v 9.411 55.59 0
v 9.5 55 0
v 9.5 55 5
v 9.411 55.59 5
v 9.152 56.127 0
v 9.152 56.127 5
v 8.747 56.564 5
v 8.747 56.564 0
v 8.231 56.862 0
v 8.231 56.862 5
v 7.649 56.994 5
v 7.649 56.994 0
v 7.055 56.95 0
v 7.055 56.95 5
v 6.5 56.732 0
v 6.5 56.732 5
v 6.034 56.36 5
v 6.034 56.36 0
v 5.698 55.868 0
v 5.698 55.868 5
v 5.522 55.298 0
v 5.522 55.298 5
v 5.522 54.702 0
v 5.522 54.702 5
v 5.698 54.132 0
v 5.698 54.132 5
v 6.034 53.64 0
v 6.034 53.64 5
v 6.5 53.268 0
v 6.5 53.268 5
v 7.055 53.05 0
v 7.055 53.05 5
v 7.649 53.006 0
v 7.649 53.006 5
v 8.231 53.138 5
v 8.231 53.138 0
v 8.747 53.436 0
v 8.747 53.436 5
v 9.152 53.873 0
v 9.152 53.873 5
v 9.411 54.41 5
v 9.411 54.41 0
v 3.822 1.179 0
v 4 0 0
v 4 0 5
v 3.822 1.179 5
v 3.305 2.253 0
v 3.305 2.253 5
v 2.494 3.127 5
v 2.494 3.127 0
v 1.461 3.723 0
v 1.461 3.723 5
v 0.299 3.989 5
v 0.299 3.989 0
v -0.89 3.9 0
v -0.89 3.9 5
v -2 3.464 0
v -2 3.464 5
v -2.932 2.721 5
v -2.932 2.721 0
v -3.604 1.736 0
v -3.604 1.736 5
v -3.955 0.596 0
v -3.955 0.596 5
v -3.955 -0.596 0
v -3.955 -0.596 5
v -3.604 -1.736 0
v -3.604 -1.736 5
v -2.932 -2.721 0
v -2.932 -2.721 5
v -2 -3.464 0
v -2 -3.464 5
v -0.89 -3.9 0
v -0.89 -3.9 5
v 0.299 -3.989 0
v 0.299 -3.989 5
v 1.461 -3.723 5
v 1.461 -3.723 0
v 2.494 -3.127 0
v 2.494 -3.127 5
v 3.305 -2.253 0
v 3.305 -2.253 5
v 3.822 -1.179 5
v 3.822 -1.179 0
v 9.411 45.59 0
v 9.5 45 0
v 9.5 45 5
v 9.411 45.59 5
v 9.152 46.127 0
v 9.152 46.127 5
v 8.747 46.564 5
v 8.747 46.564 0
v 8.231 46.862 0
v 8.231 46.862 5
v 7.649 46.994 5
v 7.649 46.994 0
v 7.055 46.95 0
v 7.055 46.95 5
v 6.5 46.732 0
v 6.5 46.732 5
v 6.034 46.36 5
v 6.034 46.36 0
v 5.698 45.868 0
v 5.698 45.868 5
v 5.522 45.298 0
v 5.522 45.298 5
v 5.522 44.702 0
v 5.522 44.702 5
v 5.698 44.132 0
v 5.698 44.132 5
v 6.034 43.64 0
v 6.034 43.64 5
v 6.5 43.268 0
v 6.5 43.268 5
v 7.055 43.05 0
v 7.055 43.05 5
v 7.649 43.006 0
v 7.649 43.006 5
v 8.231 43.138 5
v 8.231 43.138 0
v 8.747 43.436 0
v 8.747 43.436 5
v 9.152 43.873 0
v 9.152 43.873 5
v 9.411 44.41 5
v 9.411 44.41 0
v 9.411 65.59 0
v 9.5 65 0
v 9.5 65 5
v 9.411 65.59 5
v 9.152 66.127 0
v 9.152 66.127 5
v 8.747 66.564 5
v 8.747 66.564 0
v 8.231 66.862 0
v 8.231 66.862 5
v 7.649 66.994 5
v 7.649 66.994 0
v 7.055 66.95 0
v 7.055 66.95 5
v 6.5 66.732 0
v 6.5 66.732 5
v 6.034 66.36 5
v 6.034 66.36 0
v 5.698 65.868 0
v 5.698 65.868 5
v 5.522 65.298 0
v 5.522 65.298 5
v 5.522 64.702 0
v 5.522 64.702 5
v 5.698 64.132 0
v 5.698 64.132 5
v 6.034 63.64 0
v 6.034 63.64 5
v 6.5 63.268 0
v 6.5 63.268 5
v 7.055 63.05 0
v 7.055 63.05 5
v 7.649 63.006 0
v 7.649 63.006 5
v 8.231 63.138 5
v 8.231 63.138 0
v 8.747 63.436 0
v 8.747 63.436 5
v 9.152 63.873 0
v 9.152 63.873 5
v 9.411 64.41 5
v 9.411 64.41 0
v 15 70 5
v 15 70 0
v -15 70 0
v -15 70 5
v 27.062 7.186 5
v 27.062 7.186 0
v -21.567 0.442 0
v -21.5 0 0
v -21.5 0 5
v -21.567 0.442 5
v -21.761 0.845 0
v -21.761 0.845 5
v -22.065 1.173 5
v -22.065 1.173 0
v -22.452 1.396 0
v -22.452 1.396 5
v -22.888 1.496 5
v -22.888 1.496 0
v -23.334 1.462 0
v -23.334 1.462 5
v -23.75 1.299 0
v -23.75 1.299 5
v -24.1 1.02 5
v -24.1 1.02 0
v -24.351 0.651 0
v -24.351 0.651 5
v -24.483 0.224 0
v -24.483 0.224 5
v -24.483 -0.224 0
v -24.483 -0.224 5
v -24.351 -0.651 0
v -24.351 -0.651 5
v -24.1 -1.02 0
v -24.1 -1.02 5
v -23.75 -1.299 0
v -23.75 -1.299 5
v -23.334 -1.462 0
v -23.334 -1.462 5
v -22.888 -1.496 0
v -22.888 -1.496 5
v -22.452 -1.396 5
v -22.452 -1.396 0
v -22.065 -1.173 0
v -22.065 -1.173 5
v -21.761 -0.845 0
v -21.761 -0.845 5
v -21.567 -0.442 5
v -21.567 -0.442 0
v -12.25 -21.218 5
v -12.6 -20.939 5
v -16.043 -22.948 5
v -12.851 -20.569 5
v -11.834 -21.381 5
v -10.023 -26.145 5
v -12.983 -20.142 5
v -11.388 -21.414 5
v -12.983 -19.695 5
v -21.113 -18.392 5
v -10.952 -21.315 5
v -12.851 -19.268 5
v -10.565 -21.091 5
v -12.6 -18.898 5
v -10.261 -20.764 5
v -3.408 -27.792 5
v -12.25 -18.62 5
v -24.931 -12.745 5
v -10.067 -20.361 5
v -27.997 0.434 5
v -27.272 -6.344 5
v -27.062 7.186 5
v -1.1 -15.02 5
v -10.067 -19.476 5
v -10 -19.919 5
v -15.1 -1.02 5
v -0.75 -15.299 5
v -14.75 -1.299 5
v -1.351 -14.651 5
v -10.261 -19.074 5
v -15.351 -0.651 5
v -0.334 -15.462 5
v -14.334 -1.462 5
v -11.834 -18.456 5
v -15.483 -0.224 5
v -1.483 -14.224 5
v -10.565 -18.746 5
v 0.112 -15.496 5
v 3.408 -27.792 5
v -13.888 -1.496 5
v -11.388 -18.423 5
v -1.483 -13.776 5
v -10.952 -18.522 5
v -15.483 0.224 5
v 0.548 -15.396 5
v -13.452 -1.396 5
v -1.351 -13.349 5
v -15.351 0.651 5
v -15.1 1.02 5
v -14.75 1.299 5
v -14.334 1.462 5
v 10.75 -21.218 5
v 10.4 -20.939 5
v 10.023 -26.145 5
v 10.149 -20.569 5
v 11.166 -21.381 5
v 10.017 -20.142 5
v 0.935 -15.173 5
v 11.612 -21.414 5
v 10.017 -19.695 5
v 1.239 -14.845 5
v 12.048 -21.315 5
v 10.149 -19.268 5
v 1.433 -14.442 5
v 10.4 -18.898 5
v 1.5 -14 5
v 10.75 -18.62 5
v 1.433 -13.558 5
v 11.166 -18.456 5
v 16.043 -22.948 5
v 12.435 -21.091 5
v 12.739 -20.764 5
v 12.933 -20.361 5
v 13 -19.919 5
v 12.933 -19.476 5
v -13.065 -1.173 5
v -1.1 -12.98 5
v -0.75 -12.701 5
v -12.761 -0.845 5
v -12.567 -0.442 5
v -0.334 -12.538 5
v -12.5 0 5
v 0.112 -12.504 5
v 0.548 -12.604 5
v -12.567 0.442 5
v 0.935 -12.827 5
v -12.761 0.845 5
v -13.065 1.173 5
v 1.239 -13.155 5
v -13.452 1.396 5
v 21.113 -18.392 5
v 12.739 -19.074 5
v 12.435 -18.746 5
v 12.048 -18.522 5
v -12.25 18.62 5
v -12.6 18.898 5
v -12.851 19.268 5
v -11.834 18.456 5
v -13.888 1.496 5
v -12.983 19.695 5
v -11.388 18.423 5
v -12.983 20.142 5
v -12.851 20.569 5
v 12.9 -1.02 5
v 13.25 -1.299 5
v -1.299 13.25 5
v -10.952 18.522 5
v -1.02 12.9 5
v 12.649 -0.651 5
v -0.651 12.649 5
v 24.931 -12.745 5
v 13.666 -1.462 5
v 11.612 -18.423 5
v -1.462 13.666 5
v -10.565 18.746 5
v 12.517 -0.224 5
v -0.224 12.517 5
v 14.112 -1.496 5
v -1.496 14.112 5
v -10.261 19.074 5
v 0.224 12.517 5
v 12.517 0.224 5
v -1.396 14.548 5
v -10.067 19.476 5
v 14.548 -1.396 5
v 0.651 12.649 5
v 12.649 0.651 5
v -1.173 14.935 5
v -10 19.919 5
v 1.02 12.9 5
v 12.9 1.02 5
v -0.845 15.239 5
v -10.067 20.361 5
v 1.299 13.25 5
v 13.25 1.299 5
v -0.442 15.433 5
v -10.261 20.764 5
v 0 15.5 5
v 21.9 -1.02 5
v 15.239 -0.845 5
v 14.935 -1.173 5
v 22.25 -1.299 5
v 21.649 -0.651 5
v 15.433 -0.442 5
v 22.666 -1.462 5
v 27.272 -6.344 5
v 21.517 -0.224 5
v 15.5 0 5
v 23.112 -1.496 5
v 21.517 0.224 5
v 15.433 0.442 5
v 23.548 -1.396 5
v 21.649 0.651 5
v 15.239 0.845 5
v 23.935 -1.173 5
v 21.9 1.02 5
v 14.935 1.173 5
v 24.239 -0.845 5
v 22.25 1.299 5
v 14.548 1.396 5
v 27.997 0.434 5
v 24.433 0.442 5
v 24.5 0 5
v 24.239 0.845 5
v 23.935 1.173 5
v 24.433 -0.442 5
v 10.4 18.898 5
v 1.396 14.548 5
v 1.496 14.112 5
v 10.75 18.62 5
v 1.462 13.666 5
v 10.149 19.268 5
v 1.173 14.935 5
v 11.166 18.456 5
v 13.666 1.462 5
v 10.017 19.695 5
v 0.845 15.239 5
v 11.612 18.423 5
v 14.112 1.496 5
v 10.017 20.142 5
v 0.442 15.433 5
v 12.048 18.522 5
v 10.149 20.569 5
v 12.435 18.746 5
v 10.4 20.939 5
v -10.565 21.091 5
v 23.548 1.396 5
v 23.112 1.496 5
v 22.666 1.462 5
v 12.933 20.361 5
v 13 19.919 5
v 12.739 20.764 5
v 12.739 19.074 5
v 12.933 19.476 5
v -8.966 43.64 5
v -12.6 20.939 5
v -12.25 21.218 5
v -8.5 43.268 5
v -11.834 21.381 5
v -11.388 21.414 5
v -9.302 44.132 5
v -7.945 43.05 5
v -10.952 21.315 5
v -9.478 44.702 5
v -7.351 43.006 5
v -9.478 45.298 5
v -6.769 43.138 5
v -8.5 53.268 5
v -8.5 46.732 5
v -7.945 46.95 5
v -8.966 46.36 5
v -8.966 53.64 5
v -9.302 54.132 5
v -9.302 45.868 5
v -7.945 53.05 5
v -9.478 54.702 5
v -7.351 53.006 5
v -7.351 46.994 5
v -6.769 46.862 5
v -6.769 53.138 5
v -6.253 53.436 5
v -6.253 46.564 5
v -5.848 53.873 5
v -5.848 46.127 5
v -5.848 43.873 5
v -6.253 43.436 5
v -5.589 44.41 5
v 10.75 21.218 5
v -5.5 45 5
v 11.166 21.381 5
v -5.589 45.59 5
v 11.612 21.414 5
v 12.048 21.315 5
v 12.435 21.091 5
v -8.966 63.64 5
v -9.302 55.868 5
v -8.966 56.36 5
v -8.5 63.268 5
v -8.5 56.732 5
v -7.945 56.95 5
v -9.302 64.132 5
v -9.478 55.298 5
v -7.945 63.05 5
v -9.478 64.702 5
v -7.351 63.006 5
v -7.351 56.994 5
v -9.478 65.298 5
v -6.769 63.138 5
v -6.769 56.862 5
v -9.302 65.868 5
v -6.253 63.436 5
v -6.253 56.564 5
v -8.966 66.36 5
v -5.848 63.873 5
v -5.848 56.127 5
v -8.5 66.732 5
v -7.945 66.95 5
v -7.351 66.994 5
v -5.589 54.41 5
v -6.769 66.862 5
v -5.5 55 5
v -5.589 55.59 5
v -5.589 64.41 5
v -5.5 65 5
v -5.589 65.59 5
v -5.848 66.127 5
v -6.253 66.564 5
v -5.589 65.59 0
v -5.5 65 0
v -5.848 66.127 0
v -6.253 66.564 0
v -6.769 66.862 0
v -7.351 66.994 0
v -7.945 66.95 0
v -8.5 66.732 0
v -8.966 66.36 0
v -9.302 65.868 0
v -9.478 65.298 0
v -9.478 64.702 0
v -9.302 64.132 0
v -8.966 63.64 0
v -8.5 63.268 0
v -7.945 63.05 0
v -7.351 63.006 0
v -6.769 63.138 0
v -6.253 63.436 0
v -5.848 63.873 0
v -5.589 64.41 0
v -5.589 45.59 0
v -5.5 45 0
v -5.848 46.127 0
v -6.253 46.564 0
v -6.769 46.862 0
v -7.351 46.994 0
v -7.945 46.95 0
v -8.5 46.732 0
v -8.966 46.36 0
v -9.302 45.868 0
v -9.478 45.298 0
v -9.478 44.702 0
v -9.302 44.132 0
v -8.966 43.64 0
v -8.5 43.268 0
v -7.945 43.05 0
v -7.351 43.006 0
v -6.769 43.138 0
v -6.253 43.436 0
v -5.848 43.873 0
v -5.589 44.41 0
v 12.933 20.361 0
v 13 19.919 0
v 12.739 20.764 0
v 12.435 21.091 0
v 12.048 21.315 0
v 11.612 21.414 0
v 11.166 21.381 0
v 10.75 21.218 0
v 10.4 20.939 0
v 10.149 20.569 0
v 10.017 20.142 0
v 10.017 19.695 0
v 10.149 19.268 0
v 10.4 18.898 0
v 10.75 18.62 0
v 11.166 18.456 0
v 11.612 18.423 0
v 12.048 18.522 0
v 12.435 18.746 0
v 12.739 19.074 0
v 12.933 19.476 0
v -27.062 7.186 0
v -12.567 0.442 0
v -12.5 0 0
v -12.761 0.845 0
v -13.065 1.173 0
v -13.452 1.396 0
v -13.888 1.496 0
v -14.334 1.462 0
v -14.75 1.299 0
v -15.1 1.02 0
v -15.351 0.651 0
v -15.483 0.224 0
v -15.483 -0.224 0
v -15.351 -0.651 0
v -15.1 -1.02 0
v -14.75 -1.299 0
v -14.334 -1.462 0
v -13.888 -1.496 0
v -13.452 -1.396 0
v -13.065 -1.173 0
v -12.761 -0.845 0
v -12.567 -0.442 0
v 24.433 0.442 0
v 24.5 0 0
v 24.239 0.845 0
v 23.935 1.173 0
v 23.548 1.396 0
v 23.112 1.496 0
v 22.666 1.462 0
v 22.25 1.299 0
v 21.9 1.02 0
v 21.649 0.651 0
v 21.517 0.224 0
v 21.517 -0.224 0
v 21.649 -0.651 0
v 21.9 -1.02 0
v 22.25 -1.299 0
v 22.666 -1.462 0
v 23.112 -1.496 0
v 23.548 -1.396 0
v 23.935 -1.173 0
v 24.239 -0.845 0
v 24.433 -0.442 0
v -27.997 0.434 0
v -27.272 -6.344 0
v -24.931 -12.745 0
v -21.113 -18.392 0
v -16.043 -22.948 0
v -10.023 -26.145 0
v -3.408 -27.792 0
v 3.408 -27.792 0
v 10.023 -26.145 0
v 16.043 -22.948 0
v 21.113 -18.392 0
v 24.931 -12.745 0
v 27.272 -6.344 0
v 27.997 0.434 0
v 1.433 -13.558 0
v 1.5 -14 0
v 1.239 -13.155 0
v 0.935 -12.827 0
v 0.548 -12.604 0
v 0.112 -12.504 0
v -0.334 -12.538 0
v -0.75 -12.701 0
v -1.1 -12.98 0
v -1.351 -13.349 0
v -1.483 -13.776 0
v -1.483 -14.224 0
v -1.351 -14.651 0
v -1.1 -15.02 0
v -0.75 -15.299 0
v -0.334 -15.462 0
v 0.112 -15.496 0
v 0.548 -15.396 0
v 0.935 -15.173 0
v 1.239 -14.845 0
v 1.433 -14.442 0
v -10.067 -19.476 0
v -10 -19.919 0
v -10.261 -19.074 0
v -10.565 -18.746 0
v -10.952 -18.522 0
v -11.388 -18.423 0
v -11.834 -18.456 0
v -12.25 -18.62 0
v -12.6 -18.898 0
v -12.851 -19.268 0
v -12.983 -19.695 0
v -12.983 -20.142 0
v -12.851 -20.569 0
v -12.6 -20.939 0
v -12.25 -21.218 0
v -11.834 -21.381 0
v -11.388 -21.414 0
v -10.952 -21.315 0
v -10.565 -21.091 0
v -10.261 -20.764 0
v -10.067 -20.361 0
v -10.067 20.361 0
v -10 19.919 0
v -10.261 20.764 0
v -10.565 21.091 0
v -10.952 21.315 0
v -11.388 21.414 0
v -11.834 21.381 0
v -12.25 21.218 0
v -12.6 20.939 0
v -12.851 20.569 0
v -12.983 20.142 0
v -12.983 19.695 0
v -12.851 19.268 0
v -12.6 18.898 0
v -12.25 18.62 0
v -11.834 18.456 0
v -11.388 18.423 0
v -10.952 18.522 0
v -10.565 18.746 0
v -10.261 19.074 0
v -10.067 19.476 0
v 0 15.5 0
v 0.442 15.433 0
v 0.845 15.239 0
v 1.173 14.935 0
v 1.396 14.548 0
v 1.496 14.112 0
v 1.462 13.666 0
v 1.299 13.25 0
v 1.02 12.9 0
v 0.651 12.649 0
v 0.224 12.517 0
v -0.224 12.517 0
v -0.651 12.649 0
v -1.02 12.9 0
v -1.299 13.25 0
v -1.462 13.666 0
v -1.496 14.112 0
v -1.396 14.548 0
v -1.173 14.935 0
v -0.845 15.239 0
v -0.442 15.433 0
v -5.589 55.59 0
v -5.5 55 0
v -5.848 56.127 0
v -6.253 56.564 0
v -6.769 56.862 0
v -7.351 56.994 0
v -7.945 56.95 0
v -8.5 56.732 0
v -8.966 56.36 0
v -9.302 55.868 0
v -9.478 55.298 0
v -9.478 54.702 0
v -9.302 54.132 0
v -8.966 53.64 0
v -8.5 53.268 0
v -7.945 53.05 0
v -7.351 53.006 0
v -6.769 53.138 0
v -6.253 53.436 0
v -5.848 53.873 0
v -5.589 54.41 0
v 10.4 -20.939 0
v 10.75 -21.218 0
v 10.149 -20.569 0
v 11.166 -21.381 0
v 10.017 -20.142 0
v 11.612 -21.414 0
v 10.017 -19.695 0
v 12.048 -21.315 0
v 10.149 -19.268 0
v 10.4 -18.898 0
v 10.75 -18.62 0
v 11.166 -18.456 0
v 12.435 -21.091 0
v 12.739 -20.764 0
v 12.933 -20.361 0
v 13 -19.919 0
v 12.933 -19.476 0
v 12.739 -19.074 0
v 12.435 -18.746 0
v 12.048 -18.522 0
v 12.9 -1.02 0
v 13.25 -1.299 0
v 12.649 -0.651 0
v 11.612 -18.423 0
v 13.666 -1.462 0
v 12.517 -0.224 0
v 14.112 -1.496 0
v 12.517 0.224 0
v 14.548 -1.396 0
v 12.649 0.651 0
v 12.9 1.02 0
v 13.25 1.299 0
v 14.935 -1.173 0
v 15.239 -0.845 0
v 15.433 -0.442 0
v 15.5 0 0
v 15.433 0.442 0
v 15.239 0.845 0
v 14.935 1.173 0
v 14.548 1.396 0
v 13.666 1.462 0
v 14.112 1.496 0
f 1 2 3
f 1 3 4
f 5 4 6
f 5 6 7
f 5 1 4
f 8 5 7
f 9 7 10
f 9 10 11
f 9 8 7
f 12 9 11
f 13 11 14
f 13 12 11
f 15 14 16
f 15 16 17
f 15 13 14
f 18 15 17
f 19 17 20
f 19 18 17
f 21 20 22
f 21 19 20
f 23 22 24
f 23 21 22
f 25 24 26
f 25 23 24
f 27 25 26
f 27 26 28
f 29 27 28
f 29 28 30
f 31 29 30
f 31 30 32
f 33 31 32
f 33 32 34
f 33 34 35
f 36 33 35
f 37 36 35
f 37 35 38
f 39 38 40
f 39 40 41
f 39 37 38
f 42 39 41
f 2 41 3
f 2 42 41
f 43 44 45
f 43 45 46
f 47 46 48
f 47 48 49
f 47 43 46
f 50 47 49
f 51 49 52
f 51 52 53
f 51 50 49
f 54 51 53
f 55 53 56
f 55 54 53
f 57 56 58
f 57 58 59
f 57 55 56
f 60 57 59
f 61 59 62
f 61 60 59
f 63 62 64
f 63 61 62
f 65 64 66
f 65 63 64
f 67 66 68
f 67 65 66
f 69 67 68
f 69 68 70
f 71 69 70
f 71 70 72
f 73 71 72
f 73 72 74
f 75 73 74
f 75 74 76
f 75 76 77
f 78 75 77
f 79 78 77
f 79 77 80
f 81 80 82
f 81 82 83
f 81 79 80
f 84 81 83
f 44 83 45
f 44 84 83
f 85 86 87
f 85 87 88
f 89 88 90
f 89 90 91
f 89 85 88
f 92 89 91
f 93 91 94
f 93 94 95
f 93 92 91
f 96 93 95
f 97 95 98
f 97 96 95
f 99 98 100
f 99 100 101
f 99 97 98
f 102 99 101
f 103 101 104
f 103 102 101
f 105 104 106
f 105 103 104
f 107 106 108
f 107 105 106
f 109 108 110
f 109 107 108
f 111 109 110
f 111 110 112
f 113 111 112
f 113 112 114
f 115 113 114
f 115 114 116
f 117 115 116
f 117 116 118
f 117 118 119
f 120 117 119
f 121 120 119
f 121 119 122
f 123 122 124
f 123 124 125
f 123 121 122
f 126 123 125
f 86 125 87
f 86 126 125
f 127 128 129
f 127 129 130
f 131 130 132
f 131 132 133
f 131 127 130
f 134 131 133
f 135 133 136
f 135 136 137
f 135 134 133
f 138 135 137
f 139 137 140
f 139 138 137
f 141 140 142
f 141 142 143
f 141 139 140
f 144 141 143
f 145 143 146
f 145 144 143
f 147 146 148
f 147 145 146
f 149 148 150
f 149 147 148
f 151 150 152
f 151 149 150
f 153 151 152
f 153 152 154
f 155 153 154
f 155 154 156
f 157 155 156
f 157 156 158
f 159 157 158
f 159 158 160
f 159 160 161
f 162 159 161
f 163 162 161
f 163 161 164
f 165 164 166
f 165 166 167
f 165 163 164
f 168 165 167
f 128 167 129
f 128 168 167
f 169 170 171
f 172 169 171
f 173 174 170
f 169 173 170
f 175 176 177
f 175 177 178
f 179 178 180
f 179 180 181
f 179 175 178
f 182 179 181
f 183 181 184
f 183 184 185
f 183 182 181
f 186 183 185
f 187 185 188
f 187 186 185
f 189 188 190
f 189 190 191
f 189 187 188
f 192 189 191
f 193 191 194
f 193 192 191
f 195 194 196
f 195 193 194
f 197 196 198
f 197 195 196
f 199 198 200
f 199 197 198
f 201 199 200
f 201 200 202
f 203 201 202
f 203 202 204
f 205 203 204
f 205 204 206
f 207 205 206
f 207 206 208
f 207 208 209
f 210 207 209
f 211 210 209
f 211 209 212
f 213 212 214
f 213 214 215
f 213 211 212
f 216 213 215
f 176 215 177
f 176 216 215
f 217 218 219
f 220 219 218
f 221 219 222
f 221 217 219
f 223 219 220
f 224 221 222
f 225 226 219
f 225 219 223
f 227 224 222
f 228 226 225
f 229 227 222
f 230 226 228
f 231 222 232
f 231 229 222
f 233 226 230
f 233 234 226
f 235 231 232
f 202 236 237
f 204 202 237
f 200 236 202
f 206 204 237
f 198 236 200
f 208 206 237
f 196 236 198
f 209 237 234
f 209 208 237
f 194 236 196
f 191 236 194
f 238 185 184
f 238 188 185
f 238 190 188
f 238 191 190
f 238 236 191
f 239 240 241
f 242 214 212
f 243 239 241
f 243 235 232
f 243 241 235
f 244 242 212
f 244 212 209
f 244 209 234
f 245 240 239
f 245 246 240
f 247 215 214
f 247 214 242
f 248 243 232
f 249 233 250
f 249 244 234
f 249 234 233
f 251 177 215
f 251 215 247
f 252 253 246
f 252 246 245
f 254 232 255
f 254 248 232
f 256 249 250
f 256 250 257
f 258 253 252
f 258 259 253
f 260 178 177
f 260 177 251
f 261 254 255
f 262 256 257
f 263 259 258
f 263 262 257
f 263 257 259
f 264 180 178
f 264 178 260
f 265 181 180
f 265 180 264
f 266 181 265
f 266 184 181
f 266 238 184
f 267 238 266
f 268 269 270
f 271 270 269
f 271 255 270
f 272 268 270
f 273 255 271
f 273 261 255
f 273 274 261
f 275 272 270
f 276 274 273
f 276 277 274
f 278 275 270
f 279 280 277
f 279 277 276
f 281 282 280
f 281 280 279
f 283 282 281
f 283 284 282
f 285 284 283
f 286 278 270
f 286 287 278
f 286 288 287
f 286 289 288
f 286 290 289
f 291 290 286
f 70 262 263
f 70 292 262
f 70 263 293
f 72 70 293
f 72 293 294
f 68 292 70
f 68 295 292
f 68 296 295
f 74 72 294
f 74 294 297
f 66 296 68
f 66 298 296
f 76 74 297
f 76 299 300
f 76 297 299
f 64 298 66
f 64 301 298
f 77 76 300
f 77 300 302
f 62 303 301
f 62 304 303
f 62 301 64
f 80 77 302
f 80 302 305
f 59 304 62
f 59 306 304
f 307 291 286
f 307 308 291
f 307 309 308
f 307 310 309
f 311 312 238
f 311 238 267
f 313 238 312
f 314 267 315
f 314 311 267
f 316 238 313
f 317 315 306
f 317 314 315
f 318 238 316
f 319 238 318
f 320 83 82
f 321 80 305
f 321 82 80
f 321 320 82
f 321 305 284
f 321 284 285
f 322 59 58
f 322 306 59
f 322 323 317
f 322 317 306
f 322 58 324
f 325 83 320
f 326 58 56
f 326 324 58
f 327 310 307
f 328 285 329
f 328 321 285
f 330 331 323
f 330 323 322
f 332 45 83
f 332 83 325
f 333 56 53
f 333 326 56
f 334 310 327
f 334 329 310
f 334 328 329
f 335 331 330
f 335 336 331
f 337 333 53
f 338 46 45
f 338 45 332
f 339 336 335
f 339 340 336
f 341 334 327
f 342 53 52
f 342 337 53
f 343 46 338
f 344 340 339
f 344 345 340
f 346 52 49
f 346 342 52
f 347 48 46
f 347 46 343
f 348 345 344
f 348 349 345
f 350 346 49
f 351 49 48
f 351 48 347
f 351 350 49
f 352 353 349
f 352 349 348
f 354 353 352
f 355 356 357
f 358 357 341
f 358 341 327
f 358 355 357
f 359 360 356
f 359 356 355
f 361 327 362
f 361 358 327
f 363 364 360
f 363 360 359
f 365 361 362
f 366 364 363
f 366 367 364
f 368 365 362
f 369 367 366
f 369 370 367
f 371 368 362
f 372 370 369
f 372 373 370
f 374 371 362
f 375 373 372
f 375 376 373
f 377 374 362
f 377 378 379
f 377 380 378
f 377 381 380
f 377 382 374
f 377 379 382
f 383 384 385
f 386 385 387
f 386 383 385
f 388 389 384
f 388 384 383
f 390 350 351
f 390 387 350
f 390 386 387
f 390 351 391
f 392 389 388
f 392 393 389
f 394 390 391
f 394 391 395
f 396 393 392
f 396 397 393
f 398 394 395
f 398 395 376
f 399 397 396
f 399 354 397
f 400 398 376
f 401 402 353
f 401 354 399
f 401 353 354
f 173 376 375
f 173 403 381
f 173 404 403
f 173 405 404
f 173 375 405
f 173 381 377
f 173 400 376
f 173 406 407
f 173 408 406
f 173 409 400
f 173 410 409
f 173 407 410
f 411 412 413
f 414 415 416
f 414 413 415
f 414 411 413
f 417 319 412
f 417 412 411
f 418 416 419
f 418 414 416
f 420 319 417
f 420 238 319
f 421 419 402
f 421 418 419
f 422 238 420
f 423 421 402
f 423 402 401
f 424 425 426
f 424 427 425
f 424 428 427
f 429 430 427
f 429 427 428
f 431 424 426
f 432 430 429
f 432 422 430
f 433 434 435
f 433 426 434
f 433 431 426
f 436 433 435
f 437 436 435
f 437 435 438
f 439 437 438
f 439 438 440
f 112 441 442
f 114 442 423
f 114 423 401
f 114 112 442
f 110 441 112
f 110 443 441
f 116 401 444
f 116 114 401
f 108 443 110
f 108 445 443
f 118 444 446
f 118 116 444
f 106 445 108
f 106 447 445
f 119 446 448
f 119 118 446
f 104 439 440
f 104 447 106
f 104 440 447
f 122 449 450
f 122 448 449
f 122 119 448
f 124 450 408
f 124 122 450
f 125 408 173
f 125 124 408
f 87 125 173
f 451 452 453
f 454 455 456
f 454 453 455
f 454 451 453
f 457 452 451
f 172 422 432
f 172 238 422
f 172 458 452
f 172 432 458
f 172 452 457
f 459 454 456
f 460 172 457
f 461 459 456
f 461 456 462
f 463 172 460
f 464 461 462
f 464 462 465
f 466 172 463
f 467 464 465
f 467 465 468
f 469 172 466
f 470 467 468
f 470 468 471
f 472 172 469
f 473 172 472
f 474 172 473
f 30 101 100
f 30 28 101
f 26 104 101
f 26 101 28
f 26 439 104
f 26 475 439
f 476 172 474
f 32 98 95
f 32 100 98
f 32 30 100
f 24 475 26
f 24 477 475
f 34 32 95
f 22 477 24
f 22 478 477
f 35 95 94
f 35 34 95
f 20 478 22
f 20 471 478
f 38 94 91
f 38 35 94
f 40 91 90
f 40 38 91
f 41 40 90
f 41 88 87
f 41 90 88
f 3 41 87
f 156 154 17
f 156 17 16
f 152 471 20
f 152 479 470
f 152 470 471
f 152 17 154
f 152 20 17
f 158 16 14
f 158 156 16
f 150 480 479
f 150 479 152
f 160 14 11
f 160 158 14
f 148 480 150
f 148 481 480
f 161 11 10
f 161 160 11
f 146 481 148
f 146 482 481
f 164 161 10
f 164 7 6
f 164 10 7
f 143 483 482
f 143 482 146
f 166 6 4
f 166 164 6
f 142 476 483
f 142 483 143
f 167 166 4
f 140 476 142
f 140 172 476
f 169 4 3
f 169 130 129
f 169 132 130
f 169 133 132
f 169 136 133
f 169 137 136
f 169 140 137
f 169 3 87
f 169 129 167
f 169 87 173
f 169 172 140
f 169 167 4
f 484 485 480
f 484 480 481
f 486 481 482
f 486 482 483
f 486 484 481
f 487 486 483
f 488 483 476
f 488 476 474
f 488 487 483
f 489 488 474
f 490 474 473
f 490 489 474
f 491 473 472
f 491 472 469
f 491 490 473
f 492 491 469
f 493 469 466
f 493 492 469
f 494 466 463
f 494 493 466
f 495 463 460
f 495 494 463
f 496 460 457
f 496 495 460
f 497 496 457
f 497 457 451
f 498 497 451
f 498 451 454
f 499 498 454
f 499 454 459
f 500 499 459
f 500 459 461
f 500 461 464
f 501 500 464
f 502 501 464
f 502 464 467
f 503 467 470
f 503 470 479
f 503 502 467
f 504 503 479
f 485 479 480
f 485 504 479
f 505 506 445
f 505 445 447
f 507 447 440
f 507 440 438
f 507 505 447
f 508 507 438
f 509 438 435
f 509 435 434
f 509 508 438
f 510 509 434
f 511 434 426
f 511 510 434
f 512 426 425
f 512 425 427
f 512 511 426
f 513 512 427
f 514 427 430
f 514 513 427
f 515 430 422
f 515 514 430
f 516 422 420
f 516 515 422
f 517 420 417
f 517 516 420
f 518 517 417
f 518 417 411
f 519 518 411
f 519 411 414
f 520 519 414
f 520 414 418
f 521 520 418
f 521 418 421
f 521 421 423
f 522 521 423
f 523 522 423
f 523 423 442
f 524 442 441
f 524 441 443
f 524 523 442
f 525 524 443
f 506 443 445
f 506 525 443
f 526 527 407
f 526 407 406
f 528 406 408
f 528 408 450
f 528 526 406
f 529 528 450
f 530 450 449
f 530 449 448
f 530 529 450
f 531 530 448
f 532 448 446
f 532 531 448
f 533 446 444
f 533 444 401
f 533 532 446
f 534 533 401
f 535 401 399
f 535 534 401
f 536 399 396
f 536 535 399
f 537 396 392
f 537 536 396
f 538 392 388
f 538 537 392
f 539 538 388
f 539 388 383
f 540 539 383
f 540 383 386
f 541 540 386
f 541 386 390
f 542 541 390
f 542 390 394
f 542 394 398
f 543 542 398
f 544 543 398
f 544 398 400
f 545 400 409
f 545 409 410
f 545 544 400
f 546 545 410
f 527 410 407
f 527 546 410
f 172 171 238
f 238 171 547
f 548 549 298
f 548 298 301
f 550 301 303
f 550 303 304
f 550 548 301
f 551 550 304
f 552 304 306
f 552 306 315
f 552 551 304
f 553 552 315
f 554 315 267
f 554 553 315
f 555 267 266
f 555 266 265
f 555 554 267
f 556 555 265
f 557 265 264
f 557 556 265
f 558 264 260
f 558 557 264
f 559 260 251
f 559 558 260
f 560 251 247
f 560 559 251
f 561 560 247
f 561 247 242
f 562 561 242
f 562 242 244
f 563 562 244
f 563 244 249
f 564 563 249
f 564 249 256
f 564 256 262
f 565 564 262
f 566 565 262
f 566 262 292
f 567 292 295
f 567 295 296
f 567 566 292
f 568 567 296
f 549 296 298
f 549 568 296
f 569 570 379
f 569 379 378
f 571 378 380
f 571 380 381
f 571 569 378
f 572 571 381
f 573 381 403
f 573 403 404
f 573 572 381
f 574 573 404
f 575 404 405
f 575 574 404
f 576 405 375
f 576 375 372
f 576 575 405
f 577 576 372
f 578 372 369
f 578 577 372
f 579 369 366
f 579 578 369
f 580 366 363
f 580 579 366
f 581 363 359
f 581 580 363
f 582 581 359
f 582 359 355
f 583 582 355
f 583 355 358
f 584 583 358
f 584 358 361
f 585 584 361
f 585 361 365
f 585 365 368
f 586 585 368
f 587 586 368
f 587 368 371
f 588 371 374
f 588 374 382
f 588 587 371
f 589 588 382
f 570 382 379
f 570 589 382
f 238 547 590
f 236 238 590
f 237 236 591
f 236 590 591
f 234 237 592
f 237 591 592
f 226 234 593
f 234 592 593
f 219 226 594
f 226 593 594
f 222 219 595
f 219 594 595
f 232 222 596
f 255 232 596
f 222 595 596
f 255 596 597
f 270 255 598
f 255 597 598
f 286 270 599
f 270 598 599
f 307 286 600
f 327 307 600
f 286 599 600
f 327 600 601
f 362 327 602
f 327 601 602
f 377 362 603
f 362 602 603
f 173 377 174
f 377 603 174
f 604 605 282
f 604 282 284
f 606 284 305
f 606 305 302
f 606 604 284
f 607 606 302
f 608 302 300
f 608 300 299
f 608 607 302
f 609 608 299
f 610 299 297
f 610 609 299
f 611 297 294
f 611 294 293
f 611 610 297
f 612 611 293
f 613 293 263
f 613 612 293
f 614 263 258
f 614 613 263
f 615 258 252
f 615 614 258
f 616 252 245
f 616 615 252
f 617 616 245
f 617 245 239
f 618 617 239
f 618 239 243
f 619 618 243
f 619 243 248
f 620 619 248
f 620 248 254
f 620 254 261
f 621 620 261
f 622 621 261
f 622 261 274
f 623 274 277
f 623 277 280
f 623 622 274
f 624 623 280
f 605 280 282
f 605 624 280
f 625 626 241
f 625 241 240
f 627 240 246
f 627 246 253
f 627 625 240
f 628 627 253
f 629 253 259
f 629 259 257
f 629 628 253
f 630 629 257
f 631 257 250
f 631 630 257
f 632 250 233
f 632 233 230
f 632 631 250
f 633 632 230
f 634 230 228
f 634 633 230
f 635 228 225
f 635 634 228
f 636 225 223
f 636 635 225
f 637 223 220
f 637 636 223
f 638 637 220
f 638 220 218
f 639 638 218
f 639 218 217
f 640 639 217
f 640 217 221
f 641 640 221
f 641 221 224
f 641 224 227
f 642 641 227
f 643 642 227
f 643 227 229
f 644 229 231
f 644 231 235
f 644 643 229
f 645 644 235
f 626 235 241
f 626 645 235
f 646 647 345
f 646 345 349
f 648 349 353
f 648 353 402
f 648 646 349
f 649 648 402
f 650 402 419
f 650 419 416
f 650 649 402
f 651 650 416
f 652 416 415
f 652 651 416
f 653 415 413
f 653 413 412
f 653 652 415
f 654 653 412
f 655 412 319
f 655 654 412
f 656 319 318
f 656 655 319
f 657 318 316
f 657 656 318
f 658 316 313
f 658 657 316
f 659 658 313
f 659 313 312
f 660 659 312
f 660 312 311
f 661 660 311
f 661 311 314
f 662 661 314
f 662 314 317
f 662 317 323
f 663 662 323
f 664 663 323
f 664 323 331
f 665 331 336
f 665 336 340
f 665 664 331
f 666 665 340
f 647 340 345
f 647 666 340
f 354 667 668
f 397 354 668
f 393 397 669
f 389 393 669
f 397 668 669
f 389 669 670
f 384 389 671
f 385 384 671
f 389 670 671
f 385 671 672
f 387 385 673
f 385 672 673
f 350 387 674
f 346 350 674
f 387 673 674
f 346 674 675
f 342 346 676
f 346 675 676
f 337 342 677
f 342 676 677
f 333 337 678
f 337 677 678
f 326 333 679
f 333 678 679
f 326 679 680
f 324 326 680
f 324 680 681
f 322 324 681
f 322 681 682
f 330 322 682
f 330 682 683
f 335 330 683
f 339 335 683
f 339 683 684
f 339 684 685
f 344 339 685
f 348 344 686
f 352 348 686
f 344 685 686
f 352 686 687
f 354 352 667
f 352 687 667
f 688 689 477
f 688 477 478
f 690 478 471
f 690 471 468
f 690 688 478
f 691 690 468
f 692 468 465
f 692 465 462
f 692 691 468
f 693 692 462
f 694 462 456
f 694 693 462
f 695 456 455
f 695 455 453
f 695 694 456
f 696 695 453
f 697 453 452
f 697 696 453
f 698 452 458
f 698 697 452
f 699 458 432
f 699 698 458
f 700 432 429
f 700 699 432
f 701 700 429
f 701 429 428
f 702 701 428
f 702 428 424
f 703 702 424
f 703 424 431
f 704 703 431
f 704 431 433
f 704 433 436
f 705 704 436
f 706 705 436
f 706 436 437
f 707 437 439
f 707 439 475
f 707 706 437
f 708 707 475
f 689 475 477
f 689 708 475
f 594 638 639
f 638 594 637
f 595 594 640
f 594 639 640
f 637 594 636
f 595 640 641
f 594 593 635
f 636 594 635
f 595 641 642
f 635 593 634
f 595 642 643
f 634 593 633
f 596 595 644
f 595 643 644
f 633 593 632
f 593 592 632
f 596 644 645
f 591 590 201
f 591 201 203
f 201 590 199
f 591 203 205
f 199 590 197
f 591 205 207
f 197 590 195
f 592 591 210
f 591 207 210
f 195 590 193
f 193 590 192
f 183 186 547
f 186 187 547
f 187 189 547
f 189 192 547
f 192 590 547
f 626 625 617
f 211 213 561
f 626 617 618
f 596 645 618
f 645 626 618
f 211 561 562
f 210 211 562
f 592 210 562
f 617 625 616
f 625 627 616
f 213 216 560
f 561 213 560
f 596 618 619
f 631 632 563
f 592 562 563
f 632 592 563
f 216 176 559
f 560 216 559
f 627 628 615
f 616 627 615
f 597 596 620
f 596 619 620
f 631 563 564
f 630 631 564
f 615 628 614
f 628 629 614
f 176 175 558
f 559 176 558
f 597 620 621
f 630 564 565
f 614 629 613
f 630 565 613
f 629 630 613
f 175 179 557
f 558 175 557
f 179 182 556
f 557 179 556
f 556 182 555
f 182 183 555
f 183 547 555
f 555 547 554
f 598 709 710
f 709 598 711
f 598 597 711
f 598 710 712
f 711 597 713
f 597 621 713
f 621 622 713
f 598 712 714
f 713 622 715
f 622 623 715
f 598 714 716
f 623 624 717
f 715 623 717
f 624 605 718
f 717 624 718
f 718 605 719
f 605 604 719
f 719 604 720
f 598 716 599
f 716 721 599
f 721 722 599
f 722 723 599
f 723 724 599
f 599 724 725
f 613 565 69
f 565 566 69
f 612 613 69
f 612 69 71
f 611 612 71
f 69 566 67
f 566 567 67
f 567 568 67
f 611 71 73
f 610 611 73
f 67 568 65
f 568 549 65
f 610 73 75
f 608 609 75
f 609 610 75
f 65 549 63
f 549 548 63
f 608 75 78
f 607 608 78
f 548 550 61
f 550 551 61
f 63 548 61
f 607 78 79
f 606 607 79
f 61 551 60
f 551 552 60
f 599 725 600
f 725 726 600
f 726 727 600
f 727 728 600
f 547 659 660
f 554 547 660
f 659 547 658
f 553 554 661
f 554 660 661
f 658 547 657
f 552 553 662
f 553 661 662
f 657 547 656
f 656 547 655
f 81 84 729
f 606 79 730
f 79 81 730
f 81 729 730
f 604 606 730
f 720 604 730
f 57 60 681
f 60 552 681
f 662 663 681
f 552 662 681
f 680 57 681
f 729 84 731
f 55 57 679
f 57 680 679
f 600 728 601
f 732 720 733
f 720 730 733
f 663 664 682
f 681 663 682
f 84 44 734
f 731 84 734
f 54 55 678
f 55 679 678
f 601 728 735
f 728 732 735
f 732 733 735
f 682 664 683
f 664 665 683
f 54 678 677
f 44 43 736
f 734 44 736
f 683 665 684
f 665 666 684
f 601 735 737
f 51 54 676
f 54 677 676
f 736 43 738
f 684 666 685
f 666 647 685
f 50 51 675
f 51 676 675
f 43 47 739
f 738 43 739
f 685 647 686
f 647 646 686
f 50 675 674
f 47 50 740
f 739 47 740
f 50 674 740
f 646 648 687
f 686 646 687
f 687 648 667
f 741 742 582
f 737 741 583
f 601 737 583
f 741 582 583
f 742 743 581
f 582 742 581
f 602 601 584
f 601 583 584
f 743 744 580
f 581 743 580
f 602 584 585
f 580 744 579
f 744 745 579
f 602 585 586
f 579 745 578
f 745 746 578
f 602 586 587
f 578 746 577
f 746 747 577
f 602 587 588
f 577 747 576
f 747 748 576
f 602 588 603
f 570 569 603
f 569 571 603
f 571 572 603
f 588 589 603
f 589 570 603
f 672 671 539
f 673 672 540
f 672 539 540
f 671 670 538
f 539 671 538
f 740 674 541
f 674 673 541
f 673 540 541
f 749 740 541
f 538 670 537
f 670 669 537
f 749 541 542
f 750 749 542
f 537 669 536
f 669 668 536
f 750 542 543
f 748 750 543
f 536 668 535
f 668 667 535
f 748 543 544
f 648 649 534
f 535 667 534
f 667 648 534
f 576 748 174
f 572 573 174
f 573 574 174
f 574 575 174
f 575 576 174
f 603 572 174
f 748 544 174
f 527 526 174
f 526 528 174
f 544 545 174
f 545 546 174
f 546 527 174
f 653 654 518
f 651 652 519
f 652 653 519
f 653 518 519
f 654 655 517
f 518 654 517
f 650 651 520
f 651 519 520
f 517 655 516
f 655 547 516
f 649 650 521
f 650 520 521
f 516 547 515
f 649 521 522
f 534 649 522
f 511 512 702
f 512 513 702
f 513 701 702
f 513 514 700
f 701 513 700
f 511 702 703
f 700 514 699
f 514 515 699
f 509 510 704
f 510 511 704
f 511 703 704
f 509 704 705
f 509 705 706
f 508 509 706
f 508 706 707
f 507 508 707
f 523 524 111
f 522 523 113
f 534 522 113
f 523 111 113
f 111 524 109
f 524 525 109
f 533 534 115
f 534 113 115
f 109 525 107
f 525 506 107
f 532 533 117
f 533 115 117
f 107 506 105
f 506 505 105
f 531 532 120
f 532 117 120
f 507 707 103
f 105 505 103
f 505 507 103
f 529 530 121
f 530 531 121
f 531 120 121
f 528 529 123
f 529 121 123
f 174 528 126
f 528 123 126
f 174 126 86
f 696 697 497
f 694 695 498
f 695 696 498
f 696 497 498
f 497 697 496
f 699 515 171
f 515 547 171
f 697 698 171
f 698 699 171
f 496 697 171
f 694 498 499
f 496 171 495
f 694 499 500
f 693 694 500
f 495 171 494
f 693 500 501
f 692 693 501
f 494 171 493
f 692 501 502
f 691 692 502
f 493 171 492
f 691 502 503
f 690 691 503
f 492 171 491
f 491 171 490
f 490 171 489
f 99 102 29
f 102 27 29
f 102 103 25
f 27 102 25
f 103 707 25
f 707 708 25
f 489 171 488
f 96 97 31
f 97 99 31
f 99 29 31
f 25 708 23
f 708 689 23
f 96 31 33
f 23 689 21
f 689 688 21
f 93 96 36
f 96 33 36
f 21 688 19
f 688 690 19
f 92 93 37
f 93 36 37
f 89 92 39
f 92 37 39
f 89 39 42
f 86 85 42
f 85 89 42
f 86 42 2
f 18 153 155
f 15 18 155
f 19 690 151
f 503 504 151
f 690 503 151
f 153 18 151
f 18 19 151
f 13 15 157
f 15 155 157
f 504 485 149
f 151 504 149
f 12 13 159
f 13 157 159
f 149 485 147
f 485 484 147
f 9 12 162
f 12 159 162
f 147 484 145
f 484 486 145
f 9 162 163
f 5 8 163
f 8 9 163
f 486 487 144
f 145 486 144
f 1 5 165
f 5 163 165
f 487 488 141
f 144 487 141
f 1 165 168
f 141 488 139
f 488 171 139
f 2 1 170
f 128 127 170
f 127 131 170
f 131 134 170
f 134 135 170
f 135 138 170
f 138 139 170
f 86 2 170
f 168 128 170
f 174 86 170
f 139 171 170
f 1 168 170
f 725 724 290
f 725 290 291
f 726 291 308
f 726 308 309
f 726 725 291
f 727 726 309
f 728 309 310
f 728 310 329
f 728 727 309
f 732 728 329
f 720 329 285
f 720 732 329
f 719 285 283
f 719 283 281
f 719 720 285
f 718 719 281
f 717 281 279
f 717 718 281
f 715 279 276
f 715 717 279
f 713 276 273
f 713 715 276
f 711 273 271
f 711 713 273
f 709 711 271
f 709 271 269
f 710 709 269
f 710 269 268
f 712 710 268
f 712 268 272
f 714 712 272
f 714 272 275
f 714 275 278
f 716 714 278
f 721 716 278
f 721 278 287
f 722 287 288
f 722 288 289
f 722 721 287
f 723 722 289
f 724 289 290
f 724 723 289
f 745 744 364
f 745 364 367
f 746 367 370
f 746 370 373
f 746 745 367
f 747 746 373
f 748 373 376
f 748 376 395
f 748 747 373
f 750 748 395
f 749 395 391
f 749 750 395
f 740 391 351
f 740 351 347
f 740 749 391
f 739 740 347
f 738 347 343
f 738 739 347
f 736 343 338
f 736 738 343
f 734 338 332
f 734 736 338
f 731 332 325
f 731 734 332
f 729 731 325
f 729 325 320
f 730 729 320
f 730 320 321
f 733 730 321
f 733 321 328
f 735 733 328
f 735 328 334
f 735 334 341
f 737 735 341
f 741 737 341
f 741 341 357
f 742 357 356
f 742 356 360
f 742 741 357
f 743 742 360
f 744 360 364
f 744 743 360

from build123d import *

# Parameters (mm, degrees)
SKETCH1_R           = 1.5
SKETCH1_R_2         = 4
SKETCH1_R_3         = 2
BOSS_EXTRUDE1_DEPTH = 5


with BuildPart() as part:
    # Sketch1 → Boss-Extrude1 (new body)
    with BuildSketch(Plane.XY):
        with BuildLine():
            Line((-15, 70), (-27.062163807, 7.186048295))
            ThreePointArc((-27.062163807, 7.186048295), (0, -28), (27.062163807, 7.186048295))
            Line((27.062163807, 7.186048295), (15, 70))
            Line((15, 70), (-15, 70))
        make_face()
        with Locations((-23, 0)):
            Circle(SKETCH1_R, mode=Mode.SUBTRACT)
        with Locations((-14, 0)):
            Circle(SKETCH1_R, mode=Mode.SUBTRACT)
        with Locations((-11.5, -19.918584287)):
            Circle(SKETCH1_R, mode=Mode.SUBTRACT)
        with Locations((0, -14)):
            Circle(SKETCH1_R, mode=Mode.SUBTRACT)
        with Locations((-11.5, 19.918584287)):
            Circle(SKETCH1_R, mode=Mode.SUBTRACT)
        with BuildLine():
            ThreePointArc((0, 12.5), (-1.5, 14), (0, 15.5))
            ThreePointArc((0, 15.5), (1.5, 14), (0, 12.5))
        make_face(mode=Mode.SUBTRACT)
        with Locations((11.5, -19.918584287)):
            Circle(SKETCH1_R, mode=Mode.SUBTRACT)
        Circle(SKETCH1_R_2, mode=Mode.SUBTRACT)
        with Locations((14, 0)):
            Circle(SKETCH1_R, mode=Mode.SUBTRACT)
        with Locations((23, 0)):
            Circle(SKETCH1_R, mode=Mode.SUBTRACT)
        with Locations((11.5, 19.918584287)):
            Circle(SKETCH1_R, mode=Mode.SUBTRACT)
        with Locations((-7.5, 45)):
            Circle(SKETCH1_R_3, mode=Mode.SUBTRACT)
        with Locations((-7.5, 55)):
            Circle(SKETCH1_R_3, mode=Mode.SUBTRACT)
        with Locations((-7.5, 65)):
            Circle(SKETCH1_R_3, mode=Mode.SUBTRACT)
        with Locations((7.5, 65)):
            Circle(SKETCH1_R_3, mode=Mode.SUBTRACT)
        with Locations((7.5, 55)):
            Circle(SKETCH1_R_3, mode=Mode.SUBTRACT)
        with Locations((7.5, 45)):
            Circle(SKETCH1_R_3, mode=Mode.SUBTRACT)
    extrude(amount=BOSS_EXTRUDE1_DEPTH)


solid = part.part
